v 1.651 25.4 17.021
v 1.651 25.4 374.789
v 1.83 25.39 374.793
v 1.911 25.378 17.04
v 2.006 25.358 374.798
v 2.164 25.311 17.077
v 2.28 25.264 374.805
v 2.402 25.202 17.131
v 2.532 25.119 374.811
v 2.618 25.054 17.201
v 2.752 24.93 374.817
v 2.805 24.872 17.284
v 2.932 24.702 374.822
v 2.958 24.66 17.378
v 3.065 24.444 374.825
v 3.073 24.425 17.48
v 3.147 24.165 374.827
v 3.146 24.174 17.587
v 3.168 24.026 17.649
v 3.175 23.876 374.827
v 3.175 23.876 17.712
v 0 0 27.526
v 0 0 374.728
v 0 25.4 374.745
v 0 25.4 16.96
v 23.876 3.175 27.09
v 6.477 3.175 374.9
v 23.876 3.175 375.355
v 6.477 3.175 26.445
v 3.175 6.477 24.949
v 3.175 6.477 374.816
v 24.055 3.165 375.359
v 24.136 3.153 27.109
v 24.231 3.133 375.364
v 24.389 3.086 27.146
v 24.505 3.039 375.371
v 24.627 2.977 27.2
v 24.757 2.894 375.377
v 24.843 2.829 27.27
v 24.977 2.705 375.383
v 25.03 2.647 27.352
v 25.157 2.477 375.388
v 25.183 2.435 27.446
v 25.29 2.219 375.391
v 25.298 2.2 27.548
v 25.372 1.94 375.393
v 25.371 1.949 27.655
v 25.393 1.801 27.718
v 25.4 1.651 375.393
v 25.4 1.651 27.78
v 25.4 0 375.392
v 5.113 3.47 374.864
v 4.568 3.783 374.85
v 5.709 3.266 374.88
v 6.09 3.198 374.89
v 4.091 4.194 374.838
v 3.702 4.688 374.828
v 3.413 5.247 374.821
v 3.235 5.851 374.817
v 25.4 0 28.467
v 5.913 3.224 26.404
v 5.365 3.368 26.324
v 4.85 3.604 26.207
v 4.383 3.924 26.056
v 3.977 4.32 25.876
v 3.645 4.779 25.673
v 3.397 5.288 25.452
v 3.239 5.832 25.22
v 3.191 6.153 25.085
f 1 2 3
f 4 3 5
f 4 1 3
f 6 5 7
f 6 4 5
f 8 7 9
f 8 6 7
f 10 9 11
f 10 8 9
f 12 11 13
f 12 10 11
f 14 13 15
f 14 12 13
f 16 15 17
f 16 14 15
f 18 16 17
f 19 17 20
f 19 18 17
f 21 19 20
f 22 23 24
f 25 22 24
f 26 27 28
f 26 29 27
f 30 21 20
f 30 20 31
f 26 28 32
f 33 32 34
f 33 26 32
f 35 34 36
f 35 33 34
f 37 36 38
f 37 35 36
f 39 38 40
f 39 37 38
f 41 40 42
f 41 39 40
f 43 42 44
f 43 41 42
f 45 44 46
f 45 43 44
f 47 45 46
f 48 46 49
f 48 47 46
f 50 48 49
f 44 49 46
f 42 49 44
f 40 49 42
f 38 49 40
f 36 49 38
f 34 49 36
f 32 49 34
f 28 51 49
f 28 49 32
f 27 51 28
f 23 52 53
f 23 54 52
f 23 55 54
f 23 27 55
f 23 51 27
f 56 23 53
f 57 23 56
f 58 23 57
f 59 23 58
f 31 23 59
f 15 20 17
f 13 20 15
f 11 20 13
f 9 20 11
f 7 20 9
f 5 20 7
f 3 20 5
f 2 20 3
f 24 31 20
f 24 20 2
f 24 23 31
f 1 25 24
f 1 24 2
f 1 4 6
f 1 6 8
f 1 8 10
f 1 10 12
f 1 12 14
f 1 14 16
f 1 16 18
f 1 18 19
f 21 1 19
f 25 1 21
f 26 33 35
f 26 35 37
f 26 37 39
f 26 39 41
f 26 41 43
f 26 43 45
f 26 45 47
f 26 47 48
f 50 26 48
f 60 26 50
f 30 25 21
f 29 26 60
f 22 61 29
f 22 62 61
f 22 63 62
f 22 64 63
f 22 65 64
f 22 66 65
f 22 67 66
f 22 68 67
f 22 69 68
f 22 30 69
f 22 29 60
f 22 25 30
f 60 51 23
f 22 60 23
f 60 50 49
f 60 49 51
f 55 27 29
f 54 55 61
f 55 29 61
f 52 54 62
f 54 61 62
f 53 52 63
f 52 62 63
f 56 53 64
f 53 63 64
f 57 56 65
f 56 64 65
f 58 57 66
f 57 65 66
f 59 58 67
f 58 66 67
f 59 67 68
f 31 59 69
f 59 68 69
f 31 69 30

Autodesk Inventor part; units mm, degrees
ref_plane "Start Plane" through (0, 0, 16.9601) normal (0, 0, 1) x (1, 0, 0)
ref_plane "End Plane" through (0, 0, 375.4098) normal (0, 0, 1) x (1, 0, 0)
sketch "Sketch" plane through (0, 0, 0) normal (0, 0, 1) x (1, 0, 0)
  line L0 (25.4, 0) -> (0, 0)
  line L1 (0, 0) -> (0, 25.4)
  line L2 (0, 25.4) -> (1.651, 25.4)
  line L3 (3.175, 23.876) -> (3.175, 6.477)
  line L4 (6.477, 3.175) -> (23.876, 3.175)
  line L5 (25.4, 1.651) -> (25.4, 0)
  line L6 (0, -11.0414) -> (0, 31.5385) construction
  line L7 (-11.0414, 0) -> (31.5385, 0) construction
  arc A0 (3.175, 6.477) -> (6.477, 3.175) centre (6.477, 6.477) ccw
  arc A1 (3.175, 23.876) -> (1.651, 25.4) centre (1.651, 23.876) ccw
  arc A2 (25.4, 1.651) -> (23.876, 3.175) centre (23.876, 1.651) ccw
  line L8 (0, 40.0545) -> (0, -19.5574) construction
  line L9 (-19.5574, 0) -> (40.0545, 0) construction
  point P0 (3.175, 25.4)
  point P1 (3.175, 3.175)
  point P2 (25.4, 3.175)
  dimension "d0" = 25.4
  dimension "d1" = 25.4
  dimension "d2" = 3.175
  dimension "d3" = 3.175
  dimension "d10" = 0
  dimension "d11" = 0
  dimension "d14" = 3.302
  dimension "d15" = 1.524
extrude "Body" add sketch "Sketch" along normal up to surface (358.4496 mm away) from surface at 16.9601
sketch "Sketch3" plane through (0, 0, 0) normal (0, 0, 1) x (1, 0, 0)
  line L0 (0, 0) -> (10, 0)
ref_plane "Work Plane3" through (0, 0, 0) normal (0, -1, 0) x (1, 0, 0)
ref_plane "Work Plane5" through (1020.9815, 716.9447, 401.9181) normal (-0.0261419, -0.0006839, 0.999658) x (0.9996582, -0.0000089, 0.0261419)
split "Split2" plane through (1020.9815, 716.9447, 401.9181) removes the side toward (-0.0261419, -0.0006839, 0.999658)
ref_plane "Work Plane6" through (-4.5304, 249.7362, -76.5277) normal (0.034189, -0.3838526, -0.9227612) x (0.9848666, 0.1699087, -0.034189)
split "Split3" plane through (-4.5304, 249.7362, -76.5277) removes the side toward (0.034189, -0.3838526, -0.9227612)
sketch "Sketch4" plane through (0, 0, 0) normal (0, -1, 0) x (1, 0, 0)
  line L0 (-2, 16.9601) -> (12, 16.9601) projected
  line L1 (-2, 375.4098) -> (12, 375.4098) projected
  dimension "d17" = 358.4496
equation "\"d0\" = G_H"
equation "\"d1\" = G_H"
equation "\"d2\" = G_T"
equation "\"d3\" = G_T"
equation "\"d14\" = G_IR"
equation "\"d15\" = G_ER"
equation "\"d4\" = G_L"
equation "\"G_H\" = 25.4"
equation "\"G_T\" = 3.175"
equation "\"G_ER\" = 1.524"
equation "\"G_IR\" = 3.302"
equation "\"G_L\" = 358.43341"
equation "\"ex\" = 0"
equation "\"G_OFFSET_START\" = -16.96012"
equation "\"G_OFFSET_END\" = -24.72708"
equation "\"d12\" = -G_OFFSET_START"
equation "\"d13\" = G_OFFSET_END + B_L"
equation "\"B_L\" = 400.13684"
properties part number "AISC - L 1 x 1 x 1/8 - 14.112" material "Steel, Mild"
